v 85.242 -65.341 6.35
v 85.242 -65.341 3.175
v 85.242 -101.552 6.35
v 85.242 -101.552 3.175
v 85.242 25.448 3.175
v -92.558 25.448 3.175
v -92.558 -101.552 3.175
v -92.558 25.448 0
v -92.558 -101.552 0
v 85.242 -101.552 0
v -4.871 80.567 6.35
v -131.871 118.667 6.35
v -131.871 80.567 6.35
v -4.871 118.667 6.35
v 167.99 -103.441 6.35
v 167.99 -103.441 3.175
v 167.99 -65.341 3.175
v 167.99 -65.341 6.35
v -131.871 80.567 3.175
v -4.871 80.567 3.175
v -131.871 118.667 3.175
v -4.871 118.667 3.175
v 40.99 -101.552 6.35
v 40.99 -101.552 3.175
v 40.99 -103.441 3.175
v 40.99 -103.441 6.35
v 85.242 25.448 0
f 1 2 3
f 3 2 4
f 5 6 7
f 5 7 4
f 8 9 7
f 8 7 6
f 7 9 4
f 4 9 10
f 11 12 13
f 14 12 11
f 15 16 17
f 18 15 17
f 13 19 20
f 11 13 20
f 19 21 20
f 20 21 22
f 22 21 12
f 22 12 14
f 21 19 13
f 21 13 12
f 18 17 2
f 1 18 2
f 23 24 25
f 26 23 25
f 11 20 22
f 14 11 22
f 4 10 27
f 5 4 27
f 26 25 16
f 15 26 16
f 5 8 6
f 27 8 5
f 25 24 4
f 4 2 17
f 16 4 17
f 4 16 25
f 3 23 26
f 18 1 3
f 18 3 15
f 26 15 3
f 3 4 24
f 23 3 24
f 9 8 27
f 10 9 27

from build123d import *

# Parameters (mm, degrees)
F0_W     = 177.8
F0_H     = 127
F1_DEPTH = 3.175
F4_DEPTH = 3.175
F5_W     = 127
F5_H     = 38.1
F6_DEPTH = 3.175


with BuildPart() as f1:
    # F0 (on Top) → F1 (new body)
    with BuildSketch(Plane.XY):
        with Locations((-3.657877, -38.051832)):
            Rectangle(F0_W, F0_H)
    extrude(amount=F1_DEPTH)


with BuildPart() as f4:
    # F3 (on face) → F4 (new body)
    with BuildSketch(Plane.XY.offset(3.175)):
        Polygon((167.989908, -65.34051), (85.242123, -65.34051), (85.242123, -101.551832), (40.989908, -101.551832), (40.989908, -103.44051), (167.989908, -103.44051), align=None)
    extrude(amount=F4_DEPTH)


with BuildPart() as f6:
    # F5 (on face) → F6 (new body)
    with BuildSketch(Plane.XY.offset(3.175)):
        with Locations((-68.370619, 99.616721)):
            Rectangle(F5_W, F5_H)
    extrude(amount=F6_DEPTH)


solid = Compound([f1.part, f4.part, f6.part])
